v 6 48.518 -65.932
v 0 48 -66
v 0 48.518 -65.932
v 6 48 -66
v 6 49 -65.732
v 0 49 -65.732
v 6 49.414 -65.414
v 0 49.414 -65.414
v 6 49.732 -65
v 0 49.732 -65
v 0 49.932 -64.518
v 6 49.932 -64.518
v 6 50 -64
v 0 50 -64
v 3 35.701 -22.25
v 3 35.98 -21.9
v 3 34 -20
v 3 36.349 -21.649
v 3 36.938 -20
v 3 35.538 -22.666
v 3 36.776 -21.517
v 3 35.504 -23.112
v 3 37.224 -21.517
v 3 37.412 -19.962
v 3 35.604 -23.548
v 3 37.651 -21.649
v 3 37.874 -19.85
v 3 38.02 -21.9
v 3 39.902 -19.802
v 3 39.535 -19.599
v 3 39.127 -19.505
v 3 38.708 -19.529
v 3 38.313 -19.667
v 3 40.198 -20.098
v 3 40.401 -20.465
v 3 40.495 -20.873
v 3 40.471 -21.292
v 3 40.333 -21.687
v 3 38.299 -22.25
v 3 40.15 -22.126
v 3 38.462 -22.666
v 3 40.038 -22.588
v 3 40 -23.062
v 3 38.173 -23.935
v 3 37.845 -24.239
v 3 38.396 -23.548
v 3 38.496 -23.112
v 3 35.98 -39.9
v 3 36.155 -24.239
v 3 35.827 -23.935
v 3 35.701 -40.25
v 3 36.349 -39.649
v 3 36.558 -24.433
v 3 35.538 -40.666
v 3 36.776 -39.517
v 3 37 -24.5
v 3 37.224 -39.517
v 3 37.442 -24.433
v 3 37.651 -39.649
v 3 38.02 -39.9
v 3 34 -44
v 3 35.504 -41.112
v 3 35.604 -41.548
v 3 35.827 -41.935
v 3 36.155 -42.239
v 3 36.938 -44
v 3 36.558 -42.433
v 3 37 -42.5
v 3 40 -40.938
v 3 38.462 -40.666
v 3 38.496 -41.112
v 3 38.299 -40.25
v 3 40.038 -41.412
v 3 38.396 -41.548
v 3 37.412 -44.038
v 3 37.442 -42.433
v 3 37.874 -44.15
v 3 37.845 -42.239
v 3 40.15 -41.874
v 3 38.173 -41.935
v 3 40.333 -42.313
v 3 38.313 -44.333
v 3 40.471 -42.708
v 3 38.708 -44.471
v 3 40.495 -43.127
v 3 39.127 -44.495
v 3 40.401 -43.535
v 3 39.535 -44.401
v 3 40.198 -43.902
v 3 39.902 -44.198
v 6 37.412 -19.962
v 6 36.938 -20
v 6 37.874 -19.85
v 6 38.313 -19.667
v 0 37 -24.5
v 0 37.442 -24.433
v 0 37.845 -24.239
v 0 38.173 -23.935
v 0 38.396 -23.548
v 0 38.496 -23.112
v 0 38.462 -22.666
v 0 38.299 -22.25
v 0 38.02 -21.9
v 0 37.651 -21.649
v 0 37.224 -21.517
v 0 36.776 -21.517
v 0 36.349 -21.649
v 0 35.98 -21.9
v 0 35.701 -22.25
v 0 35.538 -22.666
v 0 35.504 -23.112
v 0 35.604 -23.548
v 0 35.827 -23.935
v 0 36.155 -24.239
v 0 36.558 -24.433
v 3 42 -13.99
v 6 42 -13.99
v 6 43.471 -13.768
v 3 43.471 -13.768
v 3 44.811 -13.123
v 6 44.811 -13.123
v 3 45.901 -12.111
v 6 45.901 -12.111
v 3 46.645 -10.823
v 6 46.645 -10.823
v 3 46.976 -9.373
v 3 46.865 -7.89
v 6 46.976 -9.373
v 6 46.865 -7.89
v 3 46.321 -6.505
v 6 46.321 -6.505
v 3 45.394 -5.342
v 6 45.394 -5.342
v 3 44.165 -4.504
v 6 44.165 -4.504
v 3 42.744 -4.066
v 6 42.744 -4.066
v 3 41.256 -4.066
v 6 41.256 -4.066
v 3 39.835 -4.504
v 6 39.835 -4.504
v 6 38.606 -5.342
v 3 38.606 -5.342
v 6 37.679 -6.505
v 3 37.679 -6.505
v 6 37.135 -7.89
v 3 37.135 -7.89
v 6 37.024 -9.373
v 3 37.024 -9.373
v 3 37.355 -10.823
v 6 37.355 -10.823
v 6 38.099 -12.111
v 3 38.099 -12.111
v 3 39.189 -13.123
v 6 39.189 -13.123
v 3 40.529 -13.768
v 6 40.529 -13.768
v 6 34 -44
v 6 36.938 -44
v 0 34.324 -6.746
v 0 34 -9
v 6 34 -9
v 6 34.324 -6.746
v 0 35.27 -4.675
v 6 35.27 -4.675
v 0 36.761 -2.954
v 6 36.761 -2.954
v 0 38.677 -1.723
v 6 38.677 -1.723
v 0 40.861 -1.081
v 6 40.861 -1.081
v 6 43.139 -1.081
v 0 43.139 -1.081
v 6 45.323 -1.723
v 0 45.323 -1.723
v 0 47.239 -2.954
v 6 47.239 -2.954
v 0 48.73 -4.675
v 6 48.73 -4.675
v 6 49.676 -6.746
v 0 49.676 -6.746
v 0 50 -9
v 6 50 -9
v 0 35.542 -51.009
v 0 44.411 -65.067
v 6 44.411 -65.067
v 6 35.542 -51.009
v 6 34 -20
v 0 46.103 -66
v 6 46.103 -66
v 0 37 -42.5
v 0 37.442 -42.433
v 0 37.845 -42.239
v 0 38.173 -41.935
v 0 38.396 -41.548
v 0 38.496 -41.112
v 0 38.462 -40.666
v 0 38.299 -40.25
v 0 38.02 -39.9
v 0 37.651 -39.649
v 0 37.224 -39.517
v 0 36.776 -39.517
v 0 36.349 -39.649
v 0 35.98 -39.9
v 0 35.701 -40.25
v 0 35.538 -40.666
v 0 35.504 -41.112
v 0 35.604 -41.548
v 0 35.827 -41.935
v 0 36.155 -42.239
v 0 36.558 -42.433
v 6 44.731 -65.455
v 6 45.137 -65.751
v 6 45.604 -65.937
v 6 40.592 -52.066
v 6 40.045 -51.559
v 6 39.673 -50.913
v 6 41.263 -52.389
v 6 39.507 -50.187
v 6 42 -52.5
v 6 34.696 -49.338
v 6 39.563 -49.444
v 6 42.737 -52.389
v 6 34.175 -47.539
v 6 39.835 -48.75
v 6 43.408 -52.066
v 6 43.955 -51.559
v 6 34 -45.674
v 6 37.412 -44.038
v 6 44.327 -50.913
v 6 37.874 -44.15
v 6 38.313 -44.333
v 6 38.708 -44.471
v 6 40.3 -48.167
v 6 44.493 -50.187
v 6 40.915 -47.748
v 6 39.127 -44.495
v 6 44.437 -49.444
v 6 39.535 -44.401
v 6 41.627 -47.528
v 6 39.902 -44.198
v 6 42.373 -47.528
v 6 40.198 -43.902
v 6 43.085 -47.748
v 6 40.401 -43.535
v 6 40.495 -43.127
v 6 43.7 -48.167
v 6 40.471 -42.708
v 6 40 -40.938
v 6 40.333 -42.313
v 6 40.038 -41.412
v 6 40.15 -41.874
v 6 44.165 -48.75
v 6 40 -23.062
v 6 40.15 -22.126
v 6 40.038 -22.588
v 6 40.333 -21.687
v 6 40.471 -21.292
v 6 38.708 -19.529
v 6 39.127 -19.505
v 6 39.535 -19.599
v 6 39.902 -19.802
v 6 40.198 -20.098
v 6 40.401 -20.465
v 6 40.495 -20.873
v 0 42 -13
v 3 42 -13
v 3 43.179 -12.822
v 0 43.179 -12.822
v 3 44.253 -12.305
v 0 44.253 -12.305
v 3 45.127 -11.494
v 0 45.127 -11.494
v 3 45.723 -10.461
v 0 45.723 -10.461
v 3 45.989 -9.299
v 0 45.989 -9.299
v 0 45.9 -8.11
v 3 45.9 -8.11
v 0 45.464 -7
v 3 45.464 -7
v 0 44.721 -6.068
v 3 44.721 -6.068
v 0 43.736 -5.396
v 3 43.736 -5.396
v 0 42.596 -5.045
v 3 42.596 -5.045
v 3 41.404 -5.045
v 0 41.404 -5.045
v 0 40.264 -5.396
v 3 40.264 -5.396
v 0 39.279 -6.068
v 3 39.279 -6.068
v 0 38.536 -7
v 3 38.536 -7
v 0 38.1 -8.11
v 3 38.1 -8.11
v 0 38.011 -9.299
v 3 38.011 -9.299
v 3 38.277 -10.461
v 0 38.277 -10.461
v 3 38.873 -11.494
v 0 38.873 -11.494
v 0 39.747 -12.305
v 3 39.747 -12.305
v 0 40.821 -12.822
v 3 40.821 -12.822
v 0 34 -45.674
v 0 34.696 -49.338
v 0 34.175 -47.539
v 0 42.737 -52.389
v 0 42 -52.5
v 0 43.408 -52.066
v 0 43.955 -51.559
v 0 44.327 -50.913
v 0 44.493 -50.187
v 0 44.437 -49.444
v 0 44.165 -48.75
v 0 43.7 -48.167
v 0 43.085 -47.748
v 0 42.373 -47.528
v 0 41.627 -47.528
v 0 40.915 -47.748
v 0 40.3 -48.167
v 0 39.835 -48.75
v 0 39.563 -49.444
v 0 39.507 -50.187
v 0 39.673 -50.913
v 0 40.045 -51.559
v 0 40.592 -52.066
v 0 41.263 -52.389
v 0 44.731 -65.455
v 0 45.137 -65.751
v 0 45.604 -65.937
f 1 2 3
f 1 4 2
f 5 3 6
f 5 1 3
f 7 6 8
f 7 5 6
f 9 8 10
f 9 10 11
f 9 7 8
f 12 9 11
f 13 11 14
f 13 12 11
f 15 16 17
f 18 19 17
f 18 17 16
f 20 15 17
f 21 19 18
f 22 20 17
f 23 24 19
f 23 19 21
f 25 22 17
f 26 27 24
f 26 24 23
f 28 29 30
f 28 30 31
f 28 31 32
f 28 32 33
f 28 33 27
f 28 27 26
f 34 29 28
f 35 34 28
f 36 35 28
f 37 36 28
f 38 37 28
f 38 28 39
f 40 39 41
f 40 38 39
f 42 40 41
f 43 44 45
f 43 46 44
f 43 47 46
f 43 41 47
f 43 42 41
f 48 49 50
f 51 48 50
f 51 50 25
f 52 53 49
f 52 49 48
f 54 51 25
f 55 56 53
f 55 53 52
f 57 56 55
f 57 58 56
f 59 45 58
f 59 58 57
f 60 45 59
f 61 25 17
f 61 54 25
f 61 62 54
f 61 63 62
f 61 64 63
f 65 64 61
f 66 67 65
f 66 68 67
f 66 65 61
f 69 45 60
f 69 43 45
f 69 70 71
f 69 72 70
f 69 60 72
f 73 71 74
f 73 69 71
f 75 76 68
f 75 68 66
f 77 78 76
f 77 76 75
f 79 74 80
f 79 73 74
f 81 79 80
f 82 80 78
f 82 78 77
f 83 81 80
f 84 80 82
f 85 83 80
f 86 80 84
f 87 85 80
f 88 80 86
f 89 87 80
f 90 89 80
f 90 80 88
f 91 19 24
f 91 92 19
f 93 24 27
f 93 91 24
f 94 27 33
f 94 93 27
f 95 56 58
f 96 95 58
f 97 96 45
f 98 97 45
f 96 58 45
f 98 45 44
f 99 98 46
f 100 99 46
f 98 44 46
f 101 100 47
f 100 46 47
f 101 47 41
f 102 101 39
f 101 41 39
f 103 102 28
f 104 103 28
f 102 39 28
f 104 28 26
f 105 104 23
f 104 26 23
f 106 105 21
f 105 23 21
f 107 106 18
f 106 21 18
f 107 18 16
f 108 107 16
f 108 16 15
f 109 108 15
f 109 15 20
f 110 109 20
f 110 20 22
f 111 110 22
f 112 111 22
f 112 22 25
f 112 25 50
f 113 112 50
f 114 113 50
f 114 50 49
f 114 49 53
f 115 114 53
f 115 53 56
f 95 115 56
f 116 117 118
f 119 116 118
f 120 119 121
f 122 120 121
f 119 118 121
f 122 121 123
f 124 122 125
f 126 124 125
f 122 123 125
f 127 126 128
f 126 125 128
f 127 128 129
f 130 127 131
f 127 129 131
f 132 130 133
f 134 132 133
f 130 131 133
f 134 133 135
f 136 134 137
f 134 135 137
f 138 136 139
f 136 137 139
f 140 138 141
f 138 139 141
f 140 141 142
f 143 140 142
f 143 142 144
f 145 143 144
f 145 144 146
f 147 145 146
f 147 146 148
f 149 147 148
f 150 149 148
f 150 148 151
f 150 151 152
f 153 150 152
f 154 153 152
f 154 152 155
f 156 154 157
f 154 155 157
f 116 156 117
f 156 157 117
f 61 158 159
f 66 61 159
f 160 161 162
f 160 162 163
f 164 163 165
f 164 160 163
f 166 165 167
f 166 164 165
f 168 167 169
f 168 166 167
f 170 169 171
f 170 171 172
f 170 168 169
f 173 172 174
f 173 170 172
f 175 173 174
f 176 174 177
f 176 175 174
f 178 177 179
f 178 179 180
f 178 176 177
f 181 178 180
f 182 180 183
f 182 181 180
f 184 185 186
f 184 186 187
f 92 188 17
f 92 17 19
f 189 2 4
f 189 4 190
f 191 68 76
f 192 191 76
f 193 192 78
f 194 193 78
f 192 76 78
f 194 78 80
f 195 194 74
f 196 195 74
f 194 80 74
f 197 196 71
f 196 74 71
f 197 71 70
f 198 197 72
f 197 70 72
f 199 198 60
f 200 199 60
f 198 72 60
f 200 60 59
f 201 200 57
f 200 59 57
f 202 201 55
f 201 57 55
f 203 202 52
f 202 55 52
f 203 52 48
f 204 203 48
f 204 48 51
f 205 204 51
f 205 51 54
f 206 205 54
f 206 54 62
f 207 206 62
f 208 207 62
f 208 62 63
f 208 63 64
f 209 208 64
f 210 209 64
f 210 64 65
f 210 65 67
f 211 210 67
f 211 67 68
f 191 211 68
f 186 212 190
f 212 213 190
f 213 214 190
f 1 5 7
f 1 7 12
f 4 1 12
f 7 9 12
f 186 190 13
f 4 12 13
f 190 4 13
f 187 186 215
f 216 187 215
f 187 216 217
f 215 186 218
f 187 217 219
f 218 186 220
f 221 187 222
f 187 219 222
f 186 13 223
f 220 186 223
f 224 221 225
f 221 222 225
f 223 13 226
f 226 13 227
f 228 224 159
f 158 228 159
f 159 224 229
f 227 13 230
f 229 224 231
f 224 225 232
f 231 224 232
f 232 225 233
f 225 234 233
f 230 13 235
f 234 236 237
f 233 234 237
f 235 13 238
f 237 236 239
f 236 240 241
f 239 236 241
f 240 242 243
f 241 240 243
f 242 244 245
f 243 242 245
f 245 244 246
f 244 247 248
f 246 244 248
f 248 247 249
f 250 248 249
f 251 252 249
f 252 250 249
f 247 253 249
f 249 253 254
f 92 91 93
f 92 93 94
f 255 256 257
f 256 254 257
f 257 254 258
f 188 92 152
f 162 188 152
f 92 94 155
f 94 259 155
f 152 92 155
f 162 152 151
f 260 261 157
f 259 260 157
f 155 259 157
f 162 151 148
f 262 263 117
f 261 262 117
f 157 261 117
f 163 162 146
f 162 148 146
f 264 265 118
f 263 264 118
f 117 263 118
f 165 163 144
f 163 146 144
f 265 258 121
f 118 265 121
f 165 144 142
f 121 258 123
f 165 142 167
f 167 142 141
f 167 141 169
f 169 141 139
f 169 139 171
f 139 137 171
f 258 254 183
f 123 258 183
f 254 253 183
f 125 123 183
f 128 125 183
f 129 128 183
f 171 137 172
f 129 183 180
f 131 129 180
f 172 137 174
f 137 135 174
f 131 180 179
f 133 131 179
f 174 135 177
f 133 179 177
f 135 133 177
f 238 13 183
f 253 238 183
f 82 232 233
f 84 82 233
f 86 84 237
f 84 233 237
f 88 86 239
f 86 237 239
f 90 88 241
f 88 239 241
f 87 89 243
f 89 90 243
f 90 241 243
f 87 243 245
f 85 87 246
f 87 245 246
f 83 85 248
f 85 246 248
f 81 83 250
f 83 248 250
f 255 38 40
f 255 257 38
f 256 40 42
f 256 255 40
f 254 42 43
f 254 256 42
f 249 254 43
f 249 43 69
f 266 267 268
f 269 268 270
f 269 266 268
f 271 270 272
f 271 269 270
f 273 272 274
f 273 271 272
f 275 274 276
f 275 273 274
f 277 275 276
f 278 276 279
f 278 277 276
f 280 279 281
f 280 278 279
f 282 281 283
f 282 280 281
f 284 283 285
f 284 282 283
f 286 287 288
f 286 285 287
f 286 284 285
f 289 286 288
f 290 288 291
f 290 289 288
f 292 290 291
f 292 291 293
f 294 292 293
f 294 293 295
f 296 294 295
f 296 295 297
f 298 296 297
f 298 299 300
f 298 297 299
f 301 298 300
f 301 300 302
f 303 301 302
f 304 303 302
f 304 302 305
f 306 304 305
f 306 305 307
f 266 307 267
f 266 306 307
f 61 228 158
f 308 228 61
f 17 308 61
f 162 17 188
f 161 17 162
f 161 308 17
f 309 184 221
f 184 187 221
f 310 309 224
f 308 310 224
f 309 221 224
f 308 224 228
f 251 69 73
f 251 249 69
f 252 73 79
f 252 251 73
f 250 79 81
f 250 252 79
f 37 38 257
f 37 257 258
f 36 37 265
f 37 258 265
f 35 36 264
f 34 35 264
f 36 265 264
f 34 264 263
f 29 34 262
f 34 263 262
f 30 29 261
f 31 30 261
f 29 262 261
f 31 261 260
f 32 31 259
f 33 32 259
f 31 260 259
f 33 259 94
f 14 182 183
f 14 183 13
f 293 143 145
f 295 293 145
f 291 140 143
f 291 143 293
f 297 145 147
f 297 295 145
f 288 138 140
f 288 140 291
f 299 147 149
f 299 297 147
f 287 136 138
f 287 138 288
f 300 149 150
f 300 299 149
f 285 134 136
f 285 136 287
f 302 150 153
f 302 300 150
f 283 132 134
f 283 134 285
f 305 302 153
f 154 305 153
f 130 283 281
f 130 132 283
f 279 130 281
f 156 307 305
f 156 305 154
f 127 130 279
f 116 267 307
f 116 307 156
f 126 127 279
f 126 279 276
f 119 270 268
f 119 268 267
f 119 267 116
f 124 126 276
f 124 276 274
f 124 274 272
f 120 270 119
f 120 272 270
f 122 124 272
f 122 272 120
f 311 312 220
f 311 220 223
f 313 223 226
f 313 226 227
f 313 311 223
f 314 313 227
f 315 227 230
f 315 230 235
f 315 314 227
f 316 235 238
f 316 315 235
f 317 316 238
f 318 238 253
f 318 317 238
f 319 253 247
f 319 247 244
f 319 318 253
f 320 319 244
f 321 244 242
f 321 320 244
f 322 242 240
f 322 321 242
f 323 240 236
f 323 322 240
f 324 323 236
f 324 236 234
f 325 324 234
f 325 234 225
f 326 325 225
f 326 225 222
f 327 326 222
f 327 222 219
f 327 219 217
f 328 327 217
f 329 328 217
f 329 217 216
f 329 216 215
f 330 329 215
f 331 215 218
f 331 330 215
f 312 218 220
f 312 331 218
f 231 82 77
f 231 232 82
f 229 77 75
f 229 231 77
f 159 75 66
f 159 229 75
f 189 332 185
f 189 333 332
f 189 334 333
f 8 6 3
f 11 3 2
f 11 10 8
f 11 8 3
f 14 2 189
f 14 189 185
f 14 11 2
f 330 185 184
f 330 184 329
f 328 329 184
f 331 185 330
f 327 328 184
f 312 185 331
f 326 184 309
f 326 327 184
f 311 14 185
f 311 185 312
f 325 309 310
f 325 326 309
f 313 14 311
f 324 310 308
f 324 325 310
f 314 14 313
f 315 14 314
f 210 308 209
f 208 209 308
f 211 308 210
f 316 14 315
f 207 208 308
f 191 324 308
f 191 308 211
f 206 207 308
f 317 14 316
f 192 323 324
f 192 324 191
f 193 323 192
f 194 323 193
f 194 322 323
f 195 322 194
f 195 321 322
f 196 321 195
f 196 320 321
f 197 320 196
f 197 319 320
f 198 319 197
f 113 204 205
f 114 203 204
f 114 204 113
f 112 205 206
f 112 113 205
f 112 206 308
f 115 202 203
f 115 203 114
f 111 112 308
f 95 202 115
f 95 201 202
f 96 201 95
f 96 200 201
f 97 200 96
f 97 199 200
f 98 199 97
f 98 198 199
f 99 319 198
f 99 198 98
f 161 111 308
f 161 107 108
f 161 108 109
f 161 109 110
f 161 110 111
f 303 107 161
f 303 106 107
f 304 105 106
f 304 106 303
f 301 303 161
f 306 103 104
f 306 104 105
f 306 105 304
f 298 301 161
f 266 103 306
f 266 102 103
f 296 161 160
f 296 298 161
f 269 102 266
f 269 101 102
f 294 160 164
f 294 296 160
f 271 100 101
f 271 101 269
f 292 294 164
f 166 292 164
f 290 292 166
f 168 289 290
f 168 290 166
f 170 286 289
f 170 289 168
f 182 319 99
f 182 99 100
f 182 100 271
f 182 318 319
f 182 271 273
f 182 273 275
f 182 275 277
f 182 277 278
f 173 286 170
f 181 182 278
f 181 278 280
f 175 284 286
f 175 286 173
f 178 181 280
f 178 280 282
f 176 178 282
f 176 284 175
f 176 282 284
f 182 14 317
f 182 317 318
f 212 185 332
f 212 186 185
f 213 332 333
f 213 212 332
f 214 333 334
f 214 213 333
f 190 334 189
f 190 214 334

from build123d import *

# Parameters (mm, degrees)
SKETCH27_R          = 4
SKETCH27_R_2        = 2.5
BOSS_EXTRUDE1_DEPTH = 6
SKETCH33_R          = 4.99
CUT_EXTRUDE2_DEPTH  = 3
SKETCH34_W          = 24
SKETCH34_H          = 6
CUT_EXTRUDE3_DEPTH  = 3
SKETCH35_R          = 1.5
CUT_EXTRUDE4_DEPTH  = 3
FILLET1_R           = 3
CUT_EXTRUDE5_REACH  = 5
SKETCH36_R          = 1.5
FILLET3_R           = 2
FILLET4_R           = 10


with BuildPart() as part:
    # Sketch27 → Boss-Extrude1 (new body)
    with BuildSketch(Plane(origin=(0, 0, 0), x_dir=(0, 0, -1), z_dir=(1, 0, 0))):
        with BuildLine():
            Line((9, 50), (66, 50))
            Line((66, 50), (66, 45))
            Line((66, 45), (48.564398788, 34))
            Line((48.564398788, 34), (9, 34))
            ThreePointArc((9, 34), (1, 42), (9, 50))
        make_face()
        with Locations((9, 42)):
            Circle(SKETCH27_R, mode=Mode.SUBTRACT)
        with Locations((50, 42)):
            Circle(SKETCH27_R_2, mode=Mode.SUBTRACT)
    extrude(amount=BOSS_EXTRUDE1_DEPTH)

    # Sketch33 → Cut-Extrude2 (cut)
    with BuildSketch(Plane(origin=(6, 0, 0), x_dir=(0, 0, -1), z_dir=(1, 0, 0))):
        with Locations((9, 42)):
            Circle(SKETCH33_R)
    extrude(amount=-CUT_EXTRUDE2_DEPTH, mode=Mode.SUBTRACT)

    # Sketch34 → Cut-Extrude3 (cut)
    with BuildSketch(Plane(origin=(6, 0, 0), x_dir=(0, 0, -1), z_dir=(1, 0, 0))):
        with Locations((32, 37)):
            Rectangle(SKETCH34_W, SKETCH34_H)
    extrude(amount=-CUT_EXTRUDE3_DEPTH, mode=Mode.SUBTRACT)

    # Sketch35 → Cut-Extrude4 (cut)
    with BuildSketch(Plane(origin=(6, 0, 0), x_dir=(0, 0, -1), z_dir=(1, 0, 0))):
        with Locations((21, 39)):
            Circle(SKETCH35_R)
        with Locations((43, 39)):
            Circle(SKETCH35_R)
    extrude(amount=-CUT_EXTRUDE4_DEPTH, mode=Mode.SUBTRACT)

    # Fillet1
    fillet1_edges = [part.edges().sort_by_distance(p)[0] for p in [
        (4.5, 37.881966011, -20),
        (4.5, 40, -22.118033989),
        (4.5, 40, -41.881966011),
        (4.5, 37.881966011, -44),
    ]]
    fillet(fillet1_edges, radius=FILLET1_R)

    # Sketch36 → Cut-Extrude5 (cut, up to next)
    with BuildSketch(Plane(origin=(3, 0, 0), x_dir=(0, 0, -1), z_dir=(1, 0, 0)), mode=Mode.PRIVATE) as cut_extrude5_sk1:
        with Locations((23, 37)):
            Circle(SKETCH36_R)
    cut_extrude5_tool1 = extrude(cut_extrude5_sk1.sketch, amount=-CUT_EXTRUDE5_REACH, mode=Mode.PRIVATE) & part.part
    add(cut_extrude5_tool1.solids().sort_by_distance((3, 37, -23))[0], mode=Mode.SUBTRACT)
    # Sketch36 → Cut-Extrude5 (cut, up to next)
    with BuildSketch(Plane(origin=(3, 0, 0), x_dir=(0, 0, -1), z_dir=(1, 0, 0)), mode=Mode.PRIVATE) as cut_extrude5_sk2:
        with Locations((41, 37)):
            Circle(SKETCH36_R)
    cut_extrude5_tool2 = extrude(cut_extrude5_sk2.sketch, amount=-CUT_EXTRUDE5_REACH, mode=Mode.PRIVATE) & part.part
    add(cut_extrude5_tool2.solids().sort_by_distance((3, 37, -41))[0], mode=Mode.SUBTRACT)

    # Fillet3
    fillet3_edges = [part.edges().sort_by_distance(p)[0] for p in [
        (3, 50, -66),
        (3, 45, -66),
    ]]
    fillet(fillet3_edges, radius=FILLET3_R)

    # Fillet4
    fillet4_edges = [part.edges().sort_by_distance(p)[0] for p in [
        (3, 34, -48.564398788),
    ]]
    fillet(fillet4_edges, radius=FILLET4_R)


solid = part.part
